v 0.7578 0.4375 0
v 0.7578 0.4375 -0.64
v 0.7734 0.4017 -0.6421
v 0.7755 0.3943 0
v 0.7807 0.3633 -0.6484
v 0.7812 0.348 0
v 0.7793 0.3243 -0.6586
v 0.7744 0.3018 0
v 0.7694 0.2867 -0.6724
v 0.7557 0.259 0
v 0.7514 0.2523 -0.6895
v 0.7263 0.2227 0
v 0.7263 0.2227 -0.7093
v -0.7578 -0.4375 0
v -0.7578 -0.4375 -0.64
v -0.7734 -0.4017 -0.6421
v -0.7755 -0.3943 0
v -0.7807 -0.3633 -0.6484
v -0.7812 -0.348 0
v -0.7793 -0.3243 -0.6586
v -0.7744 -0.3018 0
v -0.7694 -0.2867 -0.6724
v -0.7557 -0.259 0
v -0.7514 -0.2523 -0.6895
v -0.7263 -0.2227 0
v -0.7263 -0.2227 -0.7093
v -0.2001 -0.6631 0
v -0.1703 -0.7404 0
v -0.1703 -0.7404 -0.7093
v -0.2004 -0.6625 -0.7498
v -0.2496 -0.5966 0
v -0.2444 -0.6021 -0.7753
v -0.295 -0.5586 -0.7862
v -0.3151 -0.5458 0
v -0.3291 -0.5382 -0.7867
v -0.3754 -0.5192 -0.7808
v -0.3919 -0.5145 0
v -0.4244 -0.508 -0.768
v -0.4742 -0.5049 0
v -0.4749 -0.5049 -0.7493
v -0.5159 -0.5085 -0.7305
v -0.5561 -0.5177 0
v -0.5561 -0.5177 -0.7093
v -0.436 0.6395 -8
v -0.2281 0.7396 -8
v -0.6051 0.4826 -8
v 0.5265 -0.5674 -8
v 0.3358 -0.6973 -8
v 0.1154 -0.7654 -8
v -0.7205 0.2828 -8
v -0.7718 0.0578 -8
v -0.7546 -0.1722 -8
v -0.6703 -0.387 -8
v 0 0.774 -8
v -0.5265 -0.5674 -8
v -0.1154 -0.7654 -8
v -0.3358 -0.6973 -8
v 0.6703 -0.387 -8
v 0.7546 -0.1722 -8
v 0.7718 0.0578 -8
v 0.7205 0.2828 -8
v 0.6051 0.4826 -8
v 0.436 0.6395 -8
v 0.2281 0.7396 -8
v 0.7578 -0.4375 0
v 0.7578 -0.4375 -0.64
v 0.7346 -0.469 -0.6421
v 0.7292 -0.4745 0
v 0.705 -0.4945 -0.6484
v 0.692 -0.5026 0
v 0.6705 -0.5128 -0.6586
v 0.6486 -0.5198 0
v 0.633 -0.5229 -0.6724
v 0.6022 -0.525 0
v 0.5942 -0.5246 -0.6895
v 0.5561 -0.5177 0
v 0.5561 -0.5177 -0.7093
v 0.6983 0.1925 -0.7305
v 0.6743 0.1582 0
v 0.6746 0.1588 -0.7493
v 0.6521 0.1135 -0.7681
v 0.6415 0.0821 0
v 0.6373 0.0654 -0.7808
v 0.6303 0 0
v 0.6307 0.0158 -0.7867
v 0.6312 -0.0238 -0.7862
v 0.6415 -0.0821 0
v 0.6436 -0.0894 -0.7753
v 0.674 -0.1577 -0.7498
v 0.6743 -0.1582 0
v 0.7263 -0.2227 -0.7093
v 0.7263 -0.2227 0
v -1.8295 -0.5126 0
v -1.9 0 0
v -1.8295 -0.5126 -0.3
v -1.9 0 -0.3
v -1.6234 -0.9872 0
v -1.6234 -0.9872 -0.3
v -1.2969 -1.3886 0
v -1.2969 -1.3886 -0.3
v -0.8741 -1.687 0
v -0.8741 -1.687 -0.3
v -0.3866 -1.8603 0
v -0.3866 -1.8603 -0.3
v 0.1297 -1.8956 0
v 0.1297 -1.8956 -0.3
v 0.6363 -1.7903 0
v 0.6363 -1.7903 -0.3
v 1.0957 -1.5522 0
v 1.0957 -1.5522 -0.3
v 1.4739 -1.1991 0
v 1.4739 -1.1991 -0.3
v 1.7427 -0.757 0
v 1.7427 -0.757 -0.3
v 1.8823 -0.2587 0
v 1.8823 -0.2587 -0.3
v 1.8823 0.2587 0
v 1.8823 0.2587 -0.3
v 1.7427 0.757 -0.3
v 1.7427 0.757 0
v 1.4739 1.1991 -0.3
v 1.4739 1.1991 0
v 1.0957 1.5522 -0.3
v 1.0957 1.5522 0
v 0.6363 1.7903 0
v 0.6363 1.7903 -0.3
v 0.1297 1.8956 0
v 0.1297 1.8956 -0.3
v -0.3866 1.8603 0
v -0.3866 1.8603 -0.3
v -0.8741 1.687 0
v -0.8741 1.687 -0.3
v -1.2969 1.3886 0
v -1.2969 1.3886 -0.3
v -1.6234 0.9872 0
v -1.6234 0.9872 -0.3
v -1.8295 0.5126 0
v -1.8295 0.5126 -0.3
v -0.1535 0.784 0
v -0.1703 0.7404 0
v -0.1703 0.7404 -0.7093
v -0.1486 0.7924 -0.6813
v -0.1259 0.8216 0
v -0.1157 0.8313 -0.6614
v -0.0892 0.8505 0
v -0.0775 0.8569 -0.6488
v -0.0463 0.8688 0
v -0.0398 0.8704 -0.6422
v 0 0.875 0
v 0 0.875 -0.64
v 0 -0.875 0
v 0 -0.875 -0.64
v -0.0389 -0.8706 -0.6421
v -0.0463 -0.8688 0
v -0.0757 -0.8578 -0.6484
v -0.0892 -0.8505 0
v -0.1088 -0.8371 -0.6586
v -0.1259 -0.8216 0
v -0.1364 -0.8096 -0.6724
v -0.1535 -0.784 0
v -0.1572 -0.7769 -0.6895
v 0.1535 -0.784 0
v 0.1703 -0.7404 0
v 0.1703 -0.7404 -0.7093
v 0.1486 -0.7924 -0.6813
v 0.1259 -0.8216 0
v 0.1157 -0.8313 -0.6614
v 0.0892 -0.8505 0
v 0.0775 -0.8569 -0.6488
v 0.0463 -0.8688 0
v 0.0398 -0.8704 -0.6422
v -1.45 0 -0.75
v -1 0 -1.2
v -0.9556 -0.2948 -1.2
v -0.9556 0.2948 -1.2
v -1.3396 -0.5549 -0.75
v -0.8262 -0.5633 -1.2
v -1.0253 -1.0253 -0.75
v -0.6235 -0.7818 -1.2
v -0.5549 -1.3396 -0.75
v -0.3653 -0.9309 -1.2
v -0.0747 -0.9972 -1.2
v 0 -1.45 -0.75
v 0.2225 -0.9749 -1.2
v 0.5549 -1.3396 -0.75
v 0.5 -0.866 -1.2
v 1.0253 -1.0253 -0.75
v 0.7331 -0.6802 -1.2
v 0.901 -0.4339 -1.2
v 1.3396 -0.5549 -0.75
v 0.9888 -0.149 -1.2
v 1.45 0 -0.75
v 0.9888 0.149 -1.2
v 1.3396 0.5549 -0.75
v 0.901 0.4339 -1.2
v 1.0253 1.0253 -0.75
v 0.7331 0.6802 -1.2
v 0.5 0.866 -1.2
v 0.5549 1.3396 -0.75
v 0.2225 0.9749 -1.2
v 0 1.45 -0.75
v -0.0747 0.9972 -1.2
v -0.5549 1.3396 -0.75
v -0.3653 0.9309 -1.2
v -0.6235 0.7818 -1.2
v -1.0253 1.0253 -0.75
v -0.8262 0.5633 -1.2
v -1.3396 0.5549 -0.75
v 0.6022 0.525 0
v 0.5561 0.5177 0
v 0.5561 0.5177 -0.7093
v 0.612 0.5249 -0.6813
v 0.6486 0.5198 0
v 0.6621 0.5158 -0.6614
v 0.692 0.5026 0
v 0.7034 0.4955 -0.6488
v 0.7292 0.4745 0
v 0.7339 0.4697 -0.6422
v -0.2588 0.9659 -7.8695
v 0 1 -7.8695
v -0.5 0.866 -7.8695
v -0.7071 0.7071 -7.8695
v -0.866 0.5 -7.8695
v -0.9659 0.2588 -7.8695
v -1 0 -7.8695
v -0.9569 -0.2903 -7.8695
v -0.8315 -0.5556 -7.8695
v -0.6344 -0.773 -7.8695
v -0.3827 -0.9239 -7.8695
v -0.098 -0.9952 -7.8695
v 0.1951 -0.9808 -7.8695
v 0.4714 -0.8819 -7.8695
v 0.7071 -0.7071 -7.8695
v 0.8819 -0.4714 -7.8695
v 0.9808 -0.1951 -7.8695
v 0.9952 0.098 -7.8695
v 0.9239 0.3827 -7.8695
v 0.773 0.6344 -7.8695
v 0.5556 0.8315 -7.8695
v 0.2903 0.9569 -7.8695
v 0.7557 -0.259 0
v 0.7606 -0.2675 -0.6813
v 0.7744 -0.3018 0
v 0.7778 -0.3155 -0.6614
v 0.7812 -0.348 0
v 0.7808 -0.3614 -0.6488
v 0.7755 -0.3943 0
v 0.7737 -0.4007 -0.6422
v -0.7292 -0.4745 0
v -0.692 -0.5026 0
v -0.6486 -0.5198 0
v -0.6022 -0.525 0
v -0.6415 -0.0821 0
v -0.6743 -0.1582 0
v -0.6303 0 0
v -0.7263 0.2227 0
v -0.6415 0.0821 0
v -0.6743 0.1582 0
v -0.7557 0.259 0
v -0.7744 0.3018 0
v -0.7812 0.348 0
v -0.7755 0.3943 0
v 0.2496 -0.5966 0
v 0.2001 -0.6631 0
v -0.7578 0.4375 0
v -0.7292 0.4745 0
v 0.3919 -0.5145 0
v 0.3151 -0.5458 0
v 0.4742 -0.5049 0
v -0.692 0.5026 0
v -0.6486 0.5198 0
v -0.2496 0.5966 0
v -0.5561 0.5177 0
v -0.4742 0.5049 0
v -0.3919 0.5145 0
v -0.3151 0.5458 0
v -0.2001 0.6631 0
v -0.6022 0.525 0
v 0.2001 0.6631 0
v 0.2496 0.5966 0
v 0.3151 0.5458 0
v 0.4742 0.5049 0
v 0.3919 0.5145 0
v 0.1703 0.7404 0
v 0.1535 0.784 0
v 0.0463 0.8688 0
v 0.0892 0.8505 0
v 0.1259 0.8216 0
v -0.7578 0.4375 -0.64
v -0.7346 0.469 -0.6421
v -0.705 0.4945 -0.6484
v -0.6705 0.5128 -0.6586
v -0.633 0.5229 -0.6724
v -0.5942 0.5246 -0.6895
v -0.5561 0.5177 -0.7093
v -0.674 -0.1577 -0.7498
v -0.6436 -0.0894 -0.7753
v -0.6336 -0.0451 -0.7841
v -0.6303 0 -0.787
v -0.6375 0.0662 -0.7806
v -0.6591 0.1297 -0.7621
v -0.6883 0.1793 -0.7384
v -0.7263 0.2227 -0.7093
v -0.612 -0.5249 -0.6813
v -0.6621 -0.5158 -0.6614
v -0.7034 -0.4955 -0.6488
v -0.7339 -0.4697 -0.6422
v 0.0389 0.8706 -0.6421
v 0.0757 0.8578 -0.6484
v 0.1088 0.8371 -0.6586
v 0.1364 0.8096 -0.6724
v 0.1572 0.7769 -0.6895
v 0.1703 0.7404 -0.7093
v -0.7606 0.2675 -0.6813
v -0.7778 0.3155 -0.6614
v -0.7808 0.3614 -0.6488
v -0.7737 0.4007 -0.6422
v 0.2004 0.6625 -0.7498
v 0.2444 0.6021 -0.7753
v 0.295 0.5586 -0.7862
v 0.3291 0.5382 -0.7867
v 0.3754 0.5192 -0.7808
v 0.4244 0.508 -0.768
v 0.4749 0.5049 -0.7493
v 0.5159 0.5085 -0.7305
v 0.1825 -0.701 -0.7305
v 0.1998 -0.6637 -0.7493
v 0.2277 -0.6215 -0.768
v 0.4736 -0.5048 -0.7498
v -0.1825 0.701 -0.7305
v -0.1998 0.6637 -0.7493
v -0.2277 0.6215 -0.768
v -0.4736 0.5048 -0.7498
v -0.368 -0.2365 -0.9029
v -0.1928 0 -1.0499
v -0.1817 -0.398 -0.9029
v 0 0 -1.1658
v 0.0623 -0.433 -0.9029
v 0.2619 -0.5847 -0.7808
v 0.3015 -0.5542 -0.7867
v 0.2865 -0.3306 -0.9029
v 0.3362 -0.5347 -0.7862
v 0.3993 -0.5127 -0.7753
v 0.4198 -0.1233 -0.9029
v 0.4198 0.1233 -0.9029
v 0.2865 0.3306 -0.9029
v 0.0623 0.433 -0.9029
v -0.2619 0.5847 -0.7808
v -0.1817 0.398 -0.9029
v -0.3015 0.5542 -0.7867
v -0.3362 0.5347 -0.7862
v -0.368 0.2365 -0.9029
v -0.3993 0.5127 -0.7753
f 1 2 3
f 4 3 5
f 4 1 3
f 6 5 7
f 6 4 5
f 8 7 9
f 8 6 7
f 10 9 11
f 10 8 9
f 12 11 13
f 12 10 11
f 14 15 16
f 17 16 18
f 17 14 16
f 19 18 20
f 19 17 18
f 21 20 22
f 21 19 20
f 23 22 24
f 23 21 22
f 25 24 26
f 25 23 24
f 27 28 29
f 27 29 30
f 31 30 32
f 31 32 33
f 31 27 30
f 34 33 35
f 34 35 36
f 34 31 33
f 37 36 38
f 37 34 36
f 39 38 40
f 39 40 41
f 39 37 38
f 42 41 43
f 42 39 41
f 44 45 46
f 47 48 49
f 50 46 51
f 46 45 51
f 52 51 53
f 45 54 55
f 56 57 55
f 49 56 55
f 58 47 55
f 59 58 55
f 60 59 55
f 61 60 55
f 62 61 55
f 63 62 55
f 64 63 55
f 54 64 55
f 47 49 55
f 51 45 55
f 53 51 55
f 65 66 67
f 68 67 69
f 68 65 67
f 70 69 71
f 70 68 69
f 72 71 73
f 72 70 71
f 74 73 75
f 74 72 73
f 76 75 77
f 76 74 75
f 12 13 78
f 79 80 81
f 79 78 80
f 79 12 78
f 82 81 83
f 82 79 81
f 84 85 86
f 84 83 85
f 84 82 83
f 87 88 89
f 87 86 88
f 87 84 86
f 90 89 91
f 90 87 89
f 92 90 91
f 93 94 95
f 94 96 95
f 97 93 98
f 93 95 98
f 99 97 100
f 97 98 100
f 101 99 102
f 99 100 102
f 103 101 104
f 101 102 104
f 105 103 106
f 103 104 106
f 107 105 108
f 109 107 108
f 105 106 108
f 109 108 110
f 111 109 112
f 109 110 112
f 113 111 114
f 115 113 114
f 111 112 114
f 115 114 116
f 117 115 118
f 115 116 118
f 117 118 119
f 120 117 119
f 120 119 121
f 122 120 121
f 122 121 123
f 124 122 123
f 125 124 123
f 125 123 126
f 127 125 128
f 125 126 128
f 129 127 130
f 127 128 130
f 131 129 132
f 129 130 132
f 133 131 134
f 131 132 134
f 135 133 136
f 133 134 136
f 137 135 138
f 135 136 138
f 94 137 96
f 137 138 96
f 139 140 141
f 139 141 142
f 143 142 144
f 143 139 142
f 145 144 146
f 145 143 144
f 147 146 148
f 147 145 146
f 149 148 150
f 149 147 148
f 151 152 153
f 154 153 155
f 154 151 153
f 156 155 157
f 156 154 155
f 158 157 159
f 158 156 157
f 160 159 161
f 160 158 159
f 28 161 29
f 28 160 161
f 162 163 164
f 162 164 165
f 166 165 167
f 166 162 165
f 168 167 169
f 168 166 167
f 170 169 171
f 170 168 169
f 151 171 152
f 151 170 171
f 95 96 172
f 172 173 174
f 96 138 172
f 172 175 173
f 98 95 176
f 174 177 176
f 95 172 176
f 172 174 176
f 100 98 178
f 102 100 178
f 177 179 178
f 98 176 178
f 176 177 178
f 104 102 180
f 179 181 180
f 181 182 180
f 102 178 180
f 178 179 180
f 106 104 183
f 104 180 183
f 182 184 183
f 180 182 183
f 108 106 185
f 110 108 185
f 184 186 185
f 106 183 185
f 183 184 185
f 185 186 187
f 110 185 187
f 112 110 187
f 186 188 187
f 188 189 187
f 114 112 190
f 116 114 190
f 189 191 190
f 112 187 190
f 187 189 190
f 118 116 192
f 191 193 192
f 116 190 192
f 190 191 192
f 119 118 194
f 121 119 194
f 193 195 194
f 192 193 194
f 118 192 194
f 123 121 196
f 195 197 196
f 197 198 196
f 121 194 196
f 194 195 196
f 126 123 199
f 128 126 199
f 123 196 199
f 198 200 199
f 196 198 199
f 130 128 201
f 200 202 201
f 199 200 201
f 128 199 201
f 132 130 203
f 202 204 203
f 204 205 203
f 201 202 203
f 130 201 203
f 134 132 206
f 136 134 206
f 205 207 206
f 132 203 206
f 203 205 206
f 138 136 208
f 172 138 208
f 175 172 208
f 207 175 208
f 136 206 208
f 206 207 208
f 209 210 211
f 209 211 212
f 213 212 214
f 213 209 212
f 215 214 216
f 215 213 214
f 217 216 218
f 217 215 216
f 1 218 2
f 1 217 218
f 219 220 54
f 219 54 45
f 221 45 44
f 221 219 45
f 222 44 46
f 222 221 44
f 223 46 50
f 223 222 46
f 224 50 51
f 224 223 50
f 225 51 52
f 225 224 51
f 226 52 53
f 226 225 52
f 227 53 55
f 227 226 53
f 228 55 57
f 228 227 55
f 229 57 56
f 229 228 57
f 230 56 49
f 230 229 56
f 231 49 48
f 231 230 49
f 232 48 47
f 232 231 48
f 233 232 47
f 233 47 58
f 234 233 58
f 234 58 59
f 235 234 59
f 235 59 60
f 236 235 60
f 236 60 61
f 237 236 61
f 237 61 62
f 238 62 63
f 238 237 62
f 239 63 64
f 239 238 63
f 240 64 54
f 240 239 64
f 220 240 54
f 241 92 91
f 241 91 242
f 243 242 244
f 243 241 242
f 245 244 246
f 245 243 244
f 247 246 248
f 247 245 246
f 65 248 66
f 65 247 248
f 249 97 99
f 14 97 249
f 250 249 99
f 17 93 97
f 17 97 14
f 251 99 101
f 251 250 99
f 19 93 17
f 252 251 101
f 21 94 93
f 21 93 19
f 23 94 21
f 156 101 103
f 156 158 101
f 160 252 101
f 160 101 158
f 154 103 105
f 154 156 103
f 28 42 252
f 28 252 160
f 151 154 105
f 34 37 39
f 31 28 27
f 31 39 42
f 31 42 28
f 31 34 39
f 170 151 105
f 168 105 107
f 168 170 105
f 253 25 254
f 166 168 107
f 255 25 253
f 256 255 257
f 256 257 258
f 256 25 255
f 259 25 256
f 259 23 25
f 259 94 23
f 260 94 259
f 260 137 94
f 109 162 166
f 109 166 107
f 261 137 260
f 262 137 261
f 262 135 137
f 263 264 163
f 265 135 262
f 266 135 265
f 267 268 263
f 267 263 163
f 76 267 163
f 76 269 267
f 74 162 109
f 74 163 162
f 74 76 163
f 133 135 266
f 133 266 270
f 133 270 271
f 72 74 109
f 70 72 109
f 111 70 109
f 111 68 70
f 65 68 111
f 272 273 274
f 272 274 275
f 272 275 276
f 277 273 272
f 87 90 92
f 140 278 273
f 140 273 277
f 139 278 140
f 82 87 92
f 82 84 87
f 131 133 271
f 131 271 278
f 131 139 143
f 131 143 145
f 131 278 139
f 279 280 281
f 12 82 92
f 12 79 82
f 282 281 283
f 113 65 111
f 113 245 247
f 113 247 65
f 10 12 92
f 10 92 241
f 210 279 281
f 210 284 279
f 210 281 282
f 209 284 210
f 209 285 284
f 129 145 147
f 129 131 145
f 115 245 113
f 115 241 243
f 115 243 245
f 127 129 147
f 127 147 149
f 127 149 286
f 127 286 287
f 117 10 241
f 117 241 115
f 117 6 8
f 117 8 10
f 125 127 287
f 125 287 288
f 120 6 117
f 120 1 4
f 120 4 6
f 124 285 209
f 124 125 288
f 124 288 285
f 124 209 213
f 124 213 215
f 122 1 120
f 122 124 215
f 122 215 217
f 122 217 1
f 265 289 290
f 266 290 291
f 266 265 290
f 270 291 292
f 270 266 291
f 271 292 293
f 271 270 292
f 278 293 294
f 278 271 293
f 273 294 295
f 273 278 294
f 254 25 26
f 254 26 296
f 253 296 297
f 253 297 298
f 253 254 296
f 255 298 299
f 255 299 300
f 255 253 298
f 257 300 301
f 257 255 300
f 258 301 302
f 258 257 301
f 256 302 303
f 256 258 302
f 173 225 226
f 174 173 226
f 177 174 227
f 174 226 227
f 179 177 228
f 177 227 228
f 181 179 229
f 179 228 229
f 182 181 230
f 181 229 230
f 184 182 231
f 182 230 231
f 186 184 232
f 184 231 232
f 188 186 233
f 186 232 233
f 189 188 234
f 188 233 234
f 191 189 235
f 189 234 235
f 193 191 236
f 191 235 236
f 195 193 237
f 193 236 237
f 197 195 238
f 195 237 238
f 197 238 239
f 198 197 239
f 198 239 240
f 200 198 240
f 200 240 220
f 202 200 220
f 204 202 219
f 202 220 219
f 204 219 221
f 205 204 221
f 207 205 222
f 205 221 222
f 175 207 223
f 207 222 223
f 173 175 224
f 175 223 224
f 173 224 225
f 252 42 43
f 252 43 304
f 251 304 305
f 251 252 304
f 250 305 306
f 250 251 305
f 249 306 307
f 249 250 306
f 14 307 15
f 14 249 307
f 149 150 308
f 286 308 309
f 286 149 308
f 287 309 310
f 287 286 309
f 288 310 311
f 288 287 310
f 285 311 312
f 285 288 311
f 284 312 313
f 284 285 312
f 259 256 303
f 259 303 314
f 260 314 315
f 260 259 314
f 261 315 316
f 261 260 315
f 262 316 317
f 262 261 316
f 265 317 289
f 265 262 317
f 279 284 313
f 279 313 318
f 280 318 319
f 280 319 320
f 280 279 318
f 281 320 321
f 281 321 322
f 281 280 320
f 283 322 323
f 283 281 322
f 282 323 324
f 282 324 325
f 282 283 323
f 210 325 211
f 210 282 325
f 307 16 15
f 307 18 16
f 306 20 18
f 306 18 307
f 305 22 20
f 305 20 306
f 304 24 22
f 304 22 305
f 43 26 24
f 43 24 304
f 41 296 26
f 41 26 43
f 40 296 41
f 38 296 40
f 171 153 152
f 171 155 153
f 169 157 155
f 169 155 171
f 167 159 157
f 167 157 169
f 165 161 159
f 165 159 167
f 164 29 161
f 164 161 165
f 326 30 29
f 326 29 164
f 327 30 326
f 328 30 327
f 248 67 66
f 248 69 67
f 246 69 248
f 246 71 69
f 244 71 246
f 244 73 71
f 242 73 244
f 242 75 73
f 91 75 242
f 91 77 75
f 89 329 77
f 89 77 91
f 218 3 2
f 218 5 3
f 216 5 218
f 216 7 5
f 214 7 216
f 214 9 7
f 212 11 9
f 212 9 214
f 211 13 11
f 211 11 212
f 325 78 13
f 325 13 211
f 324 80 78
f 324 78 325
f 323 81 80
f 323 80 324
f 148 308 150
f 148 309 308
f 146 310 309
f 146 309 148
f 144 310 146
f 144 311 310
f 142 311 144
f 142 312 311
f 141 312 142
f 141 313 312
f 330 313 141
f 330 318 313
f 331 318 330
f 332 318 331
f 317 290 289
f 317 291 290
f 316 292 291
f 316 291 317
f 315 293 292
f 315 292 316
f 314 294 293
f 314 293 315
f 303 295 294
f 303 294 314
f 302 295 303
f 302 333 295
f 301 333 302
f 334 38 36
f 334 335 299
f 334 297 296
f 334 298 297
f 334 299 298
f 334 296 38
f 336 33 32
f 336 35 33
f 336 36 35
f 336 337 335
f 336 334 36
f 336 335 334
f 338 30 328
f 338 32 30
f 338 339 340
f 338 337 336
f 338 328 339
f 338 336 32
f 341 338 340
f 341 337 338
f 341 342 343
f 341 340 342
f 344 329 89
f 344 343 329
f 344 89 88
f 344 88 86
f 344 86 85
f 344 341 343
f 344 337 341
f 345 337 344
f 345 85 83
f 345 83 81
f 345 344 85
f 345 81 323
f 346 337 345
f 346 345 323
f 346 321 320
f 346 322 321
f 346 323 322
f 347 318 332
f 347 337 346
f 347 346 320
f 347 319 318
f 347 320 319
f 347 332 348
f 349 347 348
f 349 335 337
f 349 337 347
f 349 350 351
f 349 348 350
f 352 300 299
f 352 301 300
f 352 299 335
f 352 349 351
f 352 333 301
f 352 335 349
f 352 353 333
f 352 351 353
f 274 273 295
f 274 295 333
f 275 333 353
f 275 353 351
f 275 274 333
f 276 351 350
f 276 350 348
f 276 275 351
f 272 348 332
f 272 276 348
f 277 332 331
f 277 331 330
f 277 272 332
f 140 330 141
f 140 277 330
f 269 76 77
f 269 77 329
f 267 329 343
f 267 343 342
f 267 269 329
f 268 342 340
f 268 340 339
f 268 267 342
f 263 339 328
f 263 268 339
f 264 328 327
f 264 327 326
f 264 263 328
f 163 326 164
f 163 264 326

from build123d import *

# Parameters (mm, degrees)
HEXALOBULAR_REACH = 10.439


with BuildPart() as part:
    # BodySke → Base-Revolve (revolve)
    with BuildSketch(Plane(origin=(0, 0, 0), x_dir=(0, 0, -1), z_dir=(1, 0, 0)), mode=Mode.PRIVATE) as base_revolve_sk:
        Polygon((0, 0), (0, 1.9), (0.3, 1.9), (1.2, 1), (8, 1), (8, 0), align=None)
    revolve(base_revolve_sk.sketch.rotate(Axis((0, 0, 0), (0, 0, 1)), 90), axis=Axis((0, 0, 0), (0, 0, 1)))

    # PreBSke → PreBroach (revolve, cut)
    with BuildSketch(Plane(origin=(0, 0, 0), x_dir=(0, 0, -1), z_dir=(1, 0, 0)), mode=Mode.PRIVATE) as prebroach_sk:
        Polygon((0, 0), (0, 0.875), (0.64, 0.875), (1.165753042, 0), align=None)
    revolve(prebroach_sk.sketch.rotate(Axis((0, 0, 0), (0, 0, 1)), 90), axis=Axis((0, 0, 0), (0, 0, 1)), mode=Mode.SUBTRACT)

    # Hexalobular: up to this cone (the profile starts inside it)
    hexalobular_end = Plane(origin=(0, 0, 0), z_dir=(0, 0, 1)).offset(-1.165752042) * Cone(1.664e-06, 23.374625438, 14.04489091, align=(Align.CENTER, Align.CENTER, Align.MIN), mode=Mode.PRIVATE)
    # HexSke → Hexalobular (add, up to the surface)
    with BuildSketch(Plane.XY, mode=Mode.PRIVATE) as hexalobular_sk1:
        with BuildLine():
            ThreePointArc((-0.757772228, -0.4375), (-0.779371934, -0.324649655), (-0.726328785, -0.222727273))
            ThreePointArc((-0.726328785, -0.222727273), (-0.630273039, 0), (-0.726328785, 0.222727273))
            ThreePointArc((-0.726328785, 0.222727273), (-0.779371934, 0.324649655), (-0.757772228, 0.4375))
            ThreePointArc((-0.757772228, 0.4375), (-0.875, 0), (-0.757772228, -0.4375))
        make_face()
    hexalobular_tool1 = extrude(hexalobular_sk1.sketch, amount=-HEXALOBULAR_REACH, mode=Mode.PRIVATE) & hexalobular_end
    add(hexalobular_tool1.solids().sort_by_distance((-0.76612, 0, 0))[0])
    # HexSke → Hexalobular (add, up to the surface)
    with BuildSketch(Plane.XY, mode=Mode.PRIVATE) as hexalobular_sk2:
        with BuildLine():
            ThreePointArc((0, 0.875), (-0.4375, 0.757772228), (-0.757772228, 0.4375))
            ThreePointArc((-0.757772228, 0.4375), (-0.670840815, 0.512631066), (-0.556051869, 0.517655543))
            ThreePointArc((-0.556051869, 0.517655543), (-0.31513652, 0.545832463), (-0.170276916, 0.740382816))
            ThreePointArc((-0.170276916, 0.740382816), (-0.108531118, 0.837280721), (0, 0.875))
        make_face()
    hexalobular_tool2 = extrude(hexalobular_sk2.sketch, amount=-HEXALOBULAR_REACH, mode=Mode.PRIVATE) & hexalobular_end
    add(hexalobular_tool2.solids().sort_by_distance((-0.38306, 0.66348, 0))[0])
    # HexSke → Hexalobular (add, up to the surface)
    with BuildSketch(Plane.XY, mode=Mode.PRIVATE) as hexalobular_sk3:
        with BuildLine():
            ThreePointArc((0.757772228, 0.4375), (0.4375, 0.757772228), (0, 0.875))
            ThreePointArc((0, 0.875), (0.108531118, 0.837280721), (0.170276916, 0.740382816))
            ThreePointArc((0.170276916, 0.740382816), (0.31513652, 0.545832463), (0.556051869, 0.517655543))
            ThreePointArc((0.556051869, 0.517655543), (0.670840815, 0.512631066), (0.757772228, 0.4375))
        make_face()
    hexalobular_tool3 = extrude(hexalobular_sk3.sketch, amount=-HEXALOBULAR_REACH, mode=Mode.PRIVATE) & hexalobular_end
    add(hexalobular_tool3.solids().sort_by_distance((0.38306, 0.66348, 0))[0])
    # HexSke → Hexalobular (add, up to the surface)
    with BuildSketch(Plane.XY, mode=Mode.PRIVATE) as hexalobular_sk4:
        with BuildLine():
            ThreePointArc((0.726328785, -0.222727273), (0.779371934, -0.324649655), (0.757772228, -0.4375))
            ThreePointArc((0.757772228, -0.4375), (0.845185098, -0.226466664), (0.875, 0))
            ThreePointArc((0.875, 0), (0.845185098, 0.226466664), (0.757772228, 0.4375))
            ThreePointArc((0.757772228, 0.4375), (0.779371934, 0.324649655), (0.726328785, 0.222727273))
            ThreePointArc((0.726328785, 0.222727273), (0.630273039, 0), (0.726328785, -0.222727273))
        make_face()
    hexalobular_tool4 = extrude(hexalobular_sk4.sketch, amount=-HEXALOBULAR_REACH, mode=Mode.PRIVATE) & hexalobular_end
    add(hexalobular_tool4.solids().sort_by_distance((0.76612, 0, 0))[0])
    # HexSke → Hexalobular (add, up to the surface)
    with BuildSketch(Plane.XY, mode=Mode.PRIVATE) as hexalobular_sk5:
        with BuildLine():
            ThreePointArc((0.170276916, -0.740382816), (0.108531118, -0.837280721), (0, -0.875))
            ThreePointArc((0, -0.875), (0.4375, -0.757772228), (0.757772228, -0.4375))
            ThreePointArc((0.757772228, -0.4375), (0.670840815, -0.512631066), (0.556051869, -0.517655543))
            ThreePointArc((0.556051869, -0.517655543), (0.31513652, -0.545832463), (0.170276916, -0.740382816))
        make_face()
    hexalobular_tool5 = extrude(hexalobular_sk5.sketch, amount=-HEXALOBULAR_REACH, mode=Mode.PRIVATE) & hexalobular_end
    add(hexalobular_tool5.solids().sort_by_distance((0.38306, -0.66348, 0))[0])
    # HexSke → Hexalobular (add, up to the surface)
    with BuildSketch(Plane.XY, mode=Mode.PRIVATE) as hexalobular_sk6:
        with BuildLine():
            ThreePointArc((-0.556051869, -0.517655543), (-0.670840815, -0.512631066), (-0.757772228, -0.4375))
            ThreePointArc((-0.757772228, -0.4375), (-0.4375, -0.757772228), (0, -0.875))
            ThreePointArc((0, -0.875), (-0.108531118, -0.837280721), (-0.170276916, -0.740382816))
            ThreePointArc((-0.170276916, -0.740382816), (-0.31513652, -0.545832463), (-0.556051869, -0.517655543))
        make_face()
    hexalobular_tool6 = extrude(hexalobular_sk6.sketch, amount=-HEXALOBULAR_REACH, mode=Mode.PRIVATE) & hexalobular_end
    add(hexalobular_tool6.solids().sort_by_distance((-0.38306, -0.66348, 0))[0])

    # ThdSchSke → ThreadSchematic (revolve, cut)
    with BuildSketch(Plane(origin=(0, 0, 0), x_dir=(0, 0, -1), z_dir=(1, 0, 0))):
        Polygon((8.130481161, 1), (8, 0.774), (7.869518839, 1), align=None)
    revolve(axis=Axis((0, 0, 0), (0, 0, 1)), mode=Mode.SUBTRACT)


solid = part.part
